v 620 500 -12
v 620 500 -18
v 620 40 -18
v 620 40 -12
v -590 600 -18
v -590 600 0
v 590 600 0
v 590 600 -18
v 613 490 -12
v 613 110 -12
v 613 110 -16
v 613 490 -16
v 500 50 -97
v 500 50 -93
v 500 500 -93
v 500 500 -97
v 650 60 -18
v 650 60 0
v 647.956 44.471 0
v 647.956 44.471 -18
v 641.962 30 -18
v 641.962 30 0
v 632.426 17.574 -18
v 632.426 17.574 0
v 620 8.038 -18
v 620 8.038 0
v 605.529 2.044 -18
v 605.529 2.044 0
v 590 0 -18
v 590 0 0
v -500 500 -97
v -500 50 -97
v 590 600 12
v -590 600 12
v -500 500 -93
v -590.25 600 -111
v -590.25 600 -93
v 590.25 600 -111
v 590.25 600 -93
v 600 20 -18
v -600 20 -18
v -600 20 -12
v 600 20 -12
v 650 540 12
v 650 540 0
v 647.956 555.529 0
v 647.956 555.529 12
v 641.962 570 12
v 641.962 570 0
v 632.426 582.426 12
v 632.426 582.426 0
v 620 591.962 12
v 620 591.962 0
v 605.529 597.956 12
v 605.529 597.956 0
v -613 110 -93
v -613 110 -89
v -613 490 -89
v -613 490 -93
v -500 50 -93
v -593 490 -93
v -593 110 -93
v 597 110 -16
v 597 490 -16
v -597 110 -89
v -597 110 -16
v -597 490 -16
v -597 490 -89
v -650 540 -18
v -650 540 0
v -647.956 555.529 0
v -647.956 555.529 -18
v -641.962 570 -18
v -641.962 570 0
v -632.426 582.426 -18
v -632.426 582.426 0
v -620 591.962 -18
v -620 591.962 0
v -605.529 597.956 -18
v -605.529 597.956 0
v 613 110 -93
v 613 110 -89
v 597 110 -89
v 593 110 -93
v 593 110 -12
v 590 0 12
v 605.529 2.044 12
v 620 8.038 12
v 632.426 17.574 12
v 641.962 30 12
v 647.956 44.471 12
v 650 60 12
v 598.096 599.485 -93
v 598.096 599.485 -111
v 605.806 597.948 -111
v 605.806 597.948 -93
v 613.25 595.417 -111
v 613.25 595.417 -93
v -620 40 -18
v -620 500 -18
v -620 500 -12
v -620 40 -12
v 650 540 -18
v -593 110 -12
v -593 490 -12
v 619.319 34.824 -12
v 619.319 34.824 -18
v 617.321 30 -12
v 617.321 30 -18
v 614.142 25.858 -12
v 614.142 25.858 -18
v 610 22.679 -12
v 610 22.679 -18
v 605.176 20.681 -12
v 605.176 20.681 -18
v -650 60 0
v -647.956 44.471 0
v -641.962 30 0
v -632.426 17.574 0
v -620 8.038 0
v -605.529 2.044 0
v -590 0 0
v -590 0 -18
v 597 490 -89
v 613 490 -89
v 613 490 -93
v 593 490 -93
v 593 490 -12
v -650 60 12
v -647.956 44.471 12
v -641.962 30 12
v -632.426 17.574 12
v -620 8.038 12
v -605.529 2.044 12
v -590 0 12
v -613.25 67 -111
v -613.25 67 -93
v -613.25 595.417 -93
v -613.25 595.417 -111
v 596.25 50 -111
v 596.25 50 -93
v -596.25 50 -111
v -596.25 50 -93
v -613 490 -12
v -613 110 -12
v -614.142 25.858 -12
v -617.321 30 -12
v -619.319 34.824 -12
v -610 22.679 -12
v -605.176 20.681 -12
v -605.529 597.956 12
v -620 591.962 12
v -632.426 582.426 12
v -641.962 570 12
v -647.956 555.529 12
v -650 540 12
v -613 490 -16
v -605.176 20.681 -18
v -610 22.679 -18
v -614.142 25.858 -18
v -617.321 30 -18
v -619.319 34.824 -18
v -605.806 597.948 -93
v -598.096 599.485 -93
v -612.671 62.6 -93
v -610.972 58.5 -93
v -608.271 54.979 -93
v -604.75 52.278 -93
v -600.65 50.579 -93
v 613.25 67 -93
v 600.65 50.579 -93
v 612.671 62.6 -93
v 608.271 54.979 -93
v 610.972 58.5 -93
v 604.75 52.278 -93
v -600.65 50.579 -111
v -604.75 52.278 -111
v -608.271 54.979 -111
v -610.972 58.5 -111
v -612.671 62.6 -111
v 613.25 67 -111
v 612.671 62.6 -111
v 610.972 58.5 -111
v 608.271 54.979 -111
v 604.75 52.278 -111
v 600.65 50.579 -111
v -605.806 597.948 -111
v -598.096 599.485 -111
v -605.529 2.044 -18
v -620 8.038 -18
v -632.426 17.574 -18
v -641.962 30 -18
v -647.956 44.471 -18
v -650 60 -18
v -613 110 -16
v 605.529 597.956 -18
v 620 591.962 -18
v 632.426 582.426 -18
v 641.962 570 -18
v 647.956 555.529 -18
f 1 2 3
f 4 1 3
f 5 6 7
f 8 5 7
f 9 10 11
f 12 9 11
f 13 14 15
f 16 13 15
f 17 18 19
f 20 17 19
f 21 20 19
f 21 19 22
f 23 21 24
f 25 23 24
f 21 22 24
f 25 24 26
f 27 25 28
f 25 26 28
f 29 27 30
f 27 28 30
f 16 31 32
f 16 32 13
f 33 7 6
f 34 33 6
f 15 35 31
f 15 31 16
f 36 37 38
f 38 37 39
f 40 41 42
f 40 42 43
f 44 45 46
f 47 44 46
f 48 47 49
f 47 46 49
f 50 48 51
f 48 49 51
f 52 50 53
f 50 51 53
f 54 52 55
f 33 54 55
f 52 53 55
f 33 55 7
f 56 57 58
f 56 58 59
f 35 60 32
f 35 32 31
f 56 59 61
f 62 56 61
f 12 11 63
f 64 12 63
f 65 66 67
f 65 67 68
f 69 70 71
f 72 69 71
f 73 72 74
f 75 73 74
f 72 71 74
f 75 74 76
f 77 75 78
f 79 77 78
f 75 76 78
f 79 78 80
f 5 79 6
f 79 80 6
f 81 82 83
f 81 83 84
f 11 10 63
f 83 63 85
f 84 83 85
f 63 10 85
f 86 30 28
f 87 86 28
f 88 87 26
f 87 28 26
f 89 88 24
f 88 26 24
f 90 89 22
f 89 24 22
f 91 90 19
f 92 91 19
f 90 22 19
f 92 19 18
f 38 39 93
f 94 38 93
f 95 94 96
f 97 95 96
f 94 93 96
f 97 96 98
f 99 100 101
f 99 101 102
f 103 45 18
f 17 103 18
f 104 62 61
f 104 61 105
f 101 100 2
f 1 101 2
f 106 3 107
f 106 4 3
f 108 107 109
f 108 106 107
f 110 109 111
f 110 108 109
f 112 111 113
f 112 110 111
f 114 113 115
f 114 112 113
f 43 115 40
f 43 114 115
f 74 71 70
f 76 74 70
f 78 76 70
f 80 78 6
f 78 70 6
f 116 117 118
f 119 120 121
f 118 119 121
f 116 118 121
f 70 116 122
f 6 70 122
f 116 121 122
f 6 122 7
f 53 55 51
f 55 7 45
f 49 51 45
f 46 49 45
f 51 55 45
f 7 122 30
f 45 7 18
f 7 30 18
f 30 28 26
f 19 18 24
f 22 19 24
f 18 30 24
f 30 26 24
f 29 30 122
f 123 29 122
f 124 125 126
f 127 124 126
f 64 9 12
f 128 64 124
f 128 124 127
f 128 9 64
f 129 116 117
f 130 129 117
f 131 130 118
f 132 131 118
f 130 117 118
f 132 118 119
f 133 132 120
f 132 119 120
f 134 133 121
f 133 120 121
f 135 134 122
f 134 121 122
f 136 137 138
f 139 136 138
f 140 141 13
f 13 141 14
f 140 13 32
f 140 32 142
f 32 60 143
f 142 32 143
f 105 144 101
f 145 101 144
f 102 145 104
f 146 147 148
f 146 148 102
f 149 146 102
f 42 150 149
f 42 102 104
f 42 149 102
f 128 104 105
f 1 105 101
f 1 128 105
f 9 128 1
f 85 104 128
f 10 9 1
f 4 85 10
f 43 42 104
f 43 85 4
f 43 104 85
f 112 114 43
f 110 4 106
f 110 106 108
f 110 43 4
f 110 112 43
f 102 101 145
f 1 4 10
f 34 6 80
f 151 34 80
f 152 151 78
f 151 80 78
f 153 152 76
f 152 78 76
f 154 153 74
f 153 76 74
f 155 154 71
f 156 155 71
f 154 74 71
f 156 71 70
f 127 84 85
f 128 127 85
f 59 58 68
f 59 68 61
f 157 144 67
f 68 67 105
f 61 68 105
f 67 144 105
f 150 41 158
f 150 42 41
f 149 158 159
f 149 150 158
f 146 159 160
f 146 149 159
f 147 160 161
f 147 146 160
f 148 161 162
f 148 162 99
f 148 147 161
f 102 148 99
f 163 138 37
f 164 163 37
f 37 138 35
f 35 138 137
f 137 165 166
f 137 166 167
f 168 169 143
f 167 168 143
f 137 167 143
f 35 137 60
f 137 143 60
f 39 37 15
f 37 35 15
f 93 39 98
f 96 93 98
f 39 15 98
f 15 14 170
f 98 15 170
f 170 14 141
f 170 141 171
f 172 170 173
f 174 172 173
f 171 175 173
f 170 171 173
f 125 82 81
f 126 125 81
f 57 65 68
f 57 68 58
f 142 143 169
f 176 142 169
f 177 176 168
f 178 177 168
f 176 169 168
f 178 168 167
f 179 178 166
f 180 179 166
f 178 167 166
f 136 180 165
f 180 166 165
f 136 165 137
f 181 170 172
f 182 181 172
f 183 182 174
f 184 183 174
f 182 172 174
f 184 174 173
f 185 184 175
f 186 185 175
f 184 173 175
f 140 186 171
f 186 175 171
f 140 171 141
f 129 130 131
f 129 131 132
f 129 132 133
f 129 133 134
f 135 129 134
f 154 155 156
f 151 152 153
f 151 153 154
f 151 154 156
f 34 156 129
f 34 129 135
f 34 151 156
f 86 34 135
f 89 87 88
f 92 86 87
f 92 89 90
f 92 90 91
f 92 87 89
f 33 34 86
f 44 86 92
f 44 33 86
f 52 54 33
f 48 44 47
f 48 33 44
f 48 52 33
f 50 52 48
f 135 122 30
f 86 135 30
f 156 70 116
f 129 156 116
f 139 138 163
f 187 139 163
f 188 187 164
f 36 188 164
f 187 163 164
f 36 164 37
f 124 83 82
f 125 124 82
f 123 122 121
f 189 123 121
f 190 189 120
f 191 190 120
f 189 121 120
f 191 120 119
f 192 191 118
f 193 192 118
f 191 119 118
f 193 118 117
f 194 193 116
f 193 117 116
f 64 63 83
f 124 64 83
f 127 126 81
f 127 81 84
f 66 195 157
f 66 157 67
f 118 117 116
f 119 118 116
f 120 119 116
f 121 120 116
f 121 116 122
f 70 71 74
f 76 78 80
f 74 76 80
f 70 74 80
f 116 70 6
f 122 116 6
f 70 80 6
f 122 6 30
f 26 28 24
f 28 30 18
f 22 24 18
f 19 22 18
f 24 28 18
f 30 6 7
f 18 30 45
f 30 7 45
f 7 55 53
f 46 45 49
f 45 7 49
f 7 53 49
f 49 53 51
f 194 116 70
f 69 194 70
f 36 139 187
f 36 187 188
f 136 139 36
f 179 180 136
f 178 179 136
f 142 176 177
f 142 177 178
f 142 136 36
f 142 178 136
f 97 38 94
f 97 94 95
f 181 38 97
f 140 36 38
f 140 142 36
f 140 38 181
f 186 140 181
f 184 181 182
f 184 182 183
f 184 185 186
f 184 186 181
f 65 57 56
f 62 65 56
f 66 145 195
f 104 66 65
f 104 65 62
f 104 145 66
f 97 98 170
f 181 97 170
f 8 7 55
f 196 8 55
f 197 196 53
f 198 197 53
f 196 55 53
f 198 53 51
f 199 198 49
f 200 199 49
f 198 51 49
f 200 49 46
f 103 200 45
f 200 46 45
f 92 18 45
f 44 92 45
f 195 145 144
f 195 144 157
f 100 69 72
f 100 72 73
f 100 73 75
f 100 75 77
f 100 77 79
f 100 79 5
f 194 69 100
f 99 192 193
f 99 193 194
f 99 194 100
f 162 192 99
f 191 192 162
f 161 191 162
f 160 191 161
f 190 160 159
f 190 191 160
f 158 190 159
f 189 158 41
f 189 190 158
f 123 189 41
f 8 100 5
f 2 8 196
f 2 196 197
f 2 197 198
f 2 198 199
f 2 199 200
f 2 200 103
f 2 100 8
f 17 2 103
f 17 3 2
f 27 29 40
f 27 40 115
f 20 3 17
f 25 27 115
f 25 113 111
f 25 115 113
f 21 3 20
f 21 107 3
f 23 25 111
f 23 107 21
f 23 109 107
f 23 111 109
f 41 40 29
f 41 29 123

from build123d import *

# Parameters (mm, degrees)
F1_DEPTH  = 12
F3_DEPTH  = 18
F4_W      = 1240
F4_H      = 480
F5_DEPTH  = 6
F6_R      = 20
F9_DEPTH  = 380
F12_DEPTH = 18
F13_W     = 1000
F13_H     = 450
F14_DEPTH = 4


with BuildPart() as f1:
    # F0 (on Top) → F1 (new body)
    with BuildSketch(Plane.XY):
        with BuildLine():
            ThreePointArc((-650, 60), (-632.4264068712, 17.5735931288), (-590, 0))
            Line((-590, 0), (590, 0))
            ThreePointArc((590, 0), (632.4264068712, 17.5735931288), (650, 60))
            Line((650, 60), (650, 540))
            ThreePointArc((650, 540), (632.4264068712, 582.4264068712), (590, 600))
            Line((590, 600), (-590, 600))
            ThreePointArc((-590, 600), (-632.4264068712, 582.4264068712), (-650, 540))
            Line((-650, 540), (-650, 60))
        make_face()
    extrude(amount=F1_DEPTH)


with BuildPart() as f3:
    # F2 (on face) → F3 (new body)
    with BuildSketch(Plane(origin=(0, 0, 0), x_dir=(1, 0, 0), z_dir=(0, 0, -1))):
        with BuildLine():
            ThreePointArc((-650, -540), (-632.4264068712, -582.4264068712), (-590, -600))
            Line((-590, -600), (590, -600))
            ThreePointArc((590, -600), (632.4264068712, -582.4264068712), (650, -540))
            Line((650, -540), (650, -60))
            ThreePointArc((650, -60), (632.4264068712, -17.5735931288), (590, 0))
            Line((590, 0), (-590, 0))
            ThreePointArc((-590, 0), (-632.4264068712, -17.5735931288), (-650, -60))
            Line((-650, -60), (-650, -540))
        make_face()
    extrude(amount=F3_DEPTH)

    # F4 (on face) → F5 (cut)
    with BuildSketch(Plane(origin=(0, 0, -18), x_dir=(1, 0, 0), z_dir=(0, 0, -1))):
        with Locations((0, -260)):
            Rectangle(F4_W, F4_H)
    extrude(amount=-F5_DEPTH, mode=Mode.SUBTRACT)

    # F6
    f6_edges = [f3.edges().sort_by_distance(p)[0] for p in [
        (-620, 20, -15),
        (620, 20, -15),
    ]]
    fillet(f6_edges, radius=F6_R)



with BuildPart() as f9:
    # F8 (on offset) → F9 (new body)
    with BuildSketch(Plane.XZ.offset(-110)):
        Polygon((-613, -12), (-613, -16), (-597, -16), (-597, -89), (-613, -89), (-613, -93), (-593, -93), (-593, -12), align=None)
    extrude(amount=-F9_DEPTH)


with BuildPart() as f3_1:
    add(f3.part)

    add(f9.part)  # F10 merges F9
    # F10: F9 across plane
    add(f9.part.mirror(Plane.YZ))


with BuildPart() as f12:
    # F11 (on face) → F12 (new body)
    with BuildSketch(Plane(origin=(0, 0, -93), x_dir=(1, 0, 0), z_dir=(0, 0, -1))):
        with BuildLine():
            Line((596.25, -50), (-596.25, -50))
            ThreePointArc((-596.25, -50), (-608.2708152802, -54.9791847198), (-613.25, -67))
            Line((-613.25, -67), (-613.25, -595.41660401))
            ThreePointArc((-613.25, -595.41660401), (-601.97611955, -598.8429955075), (-590.25, -600))
            Line((-590.25, -600), (590.25, -600))
            ThreePointArc((590.25, -600), (601.97611955, -598.8429955075), (613.25, -595.41660401))
            Line((613.25, -595.41660401), (613.25, -67))
            ThreePointArc((613.25, -67), (608.2708152802, -54.9791847198), (596.25, -50))
        make_face()
    extrude(amount=F12_DEPTH)

    # F13 (on face) → F14 (cut)
    with BuildSketch(Plane.XY.offset(-93)):
        with Locations((0, 275)):
            Rectangle(F13_W, F13_H)
    extrude(amount=-F14_DEPTH, mode=Mode.SUBTRACT)


solid = Compound([f1.part, f3_1.part, f12.part])
